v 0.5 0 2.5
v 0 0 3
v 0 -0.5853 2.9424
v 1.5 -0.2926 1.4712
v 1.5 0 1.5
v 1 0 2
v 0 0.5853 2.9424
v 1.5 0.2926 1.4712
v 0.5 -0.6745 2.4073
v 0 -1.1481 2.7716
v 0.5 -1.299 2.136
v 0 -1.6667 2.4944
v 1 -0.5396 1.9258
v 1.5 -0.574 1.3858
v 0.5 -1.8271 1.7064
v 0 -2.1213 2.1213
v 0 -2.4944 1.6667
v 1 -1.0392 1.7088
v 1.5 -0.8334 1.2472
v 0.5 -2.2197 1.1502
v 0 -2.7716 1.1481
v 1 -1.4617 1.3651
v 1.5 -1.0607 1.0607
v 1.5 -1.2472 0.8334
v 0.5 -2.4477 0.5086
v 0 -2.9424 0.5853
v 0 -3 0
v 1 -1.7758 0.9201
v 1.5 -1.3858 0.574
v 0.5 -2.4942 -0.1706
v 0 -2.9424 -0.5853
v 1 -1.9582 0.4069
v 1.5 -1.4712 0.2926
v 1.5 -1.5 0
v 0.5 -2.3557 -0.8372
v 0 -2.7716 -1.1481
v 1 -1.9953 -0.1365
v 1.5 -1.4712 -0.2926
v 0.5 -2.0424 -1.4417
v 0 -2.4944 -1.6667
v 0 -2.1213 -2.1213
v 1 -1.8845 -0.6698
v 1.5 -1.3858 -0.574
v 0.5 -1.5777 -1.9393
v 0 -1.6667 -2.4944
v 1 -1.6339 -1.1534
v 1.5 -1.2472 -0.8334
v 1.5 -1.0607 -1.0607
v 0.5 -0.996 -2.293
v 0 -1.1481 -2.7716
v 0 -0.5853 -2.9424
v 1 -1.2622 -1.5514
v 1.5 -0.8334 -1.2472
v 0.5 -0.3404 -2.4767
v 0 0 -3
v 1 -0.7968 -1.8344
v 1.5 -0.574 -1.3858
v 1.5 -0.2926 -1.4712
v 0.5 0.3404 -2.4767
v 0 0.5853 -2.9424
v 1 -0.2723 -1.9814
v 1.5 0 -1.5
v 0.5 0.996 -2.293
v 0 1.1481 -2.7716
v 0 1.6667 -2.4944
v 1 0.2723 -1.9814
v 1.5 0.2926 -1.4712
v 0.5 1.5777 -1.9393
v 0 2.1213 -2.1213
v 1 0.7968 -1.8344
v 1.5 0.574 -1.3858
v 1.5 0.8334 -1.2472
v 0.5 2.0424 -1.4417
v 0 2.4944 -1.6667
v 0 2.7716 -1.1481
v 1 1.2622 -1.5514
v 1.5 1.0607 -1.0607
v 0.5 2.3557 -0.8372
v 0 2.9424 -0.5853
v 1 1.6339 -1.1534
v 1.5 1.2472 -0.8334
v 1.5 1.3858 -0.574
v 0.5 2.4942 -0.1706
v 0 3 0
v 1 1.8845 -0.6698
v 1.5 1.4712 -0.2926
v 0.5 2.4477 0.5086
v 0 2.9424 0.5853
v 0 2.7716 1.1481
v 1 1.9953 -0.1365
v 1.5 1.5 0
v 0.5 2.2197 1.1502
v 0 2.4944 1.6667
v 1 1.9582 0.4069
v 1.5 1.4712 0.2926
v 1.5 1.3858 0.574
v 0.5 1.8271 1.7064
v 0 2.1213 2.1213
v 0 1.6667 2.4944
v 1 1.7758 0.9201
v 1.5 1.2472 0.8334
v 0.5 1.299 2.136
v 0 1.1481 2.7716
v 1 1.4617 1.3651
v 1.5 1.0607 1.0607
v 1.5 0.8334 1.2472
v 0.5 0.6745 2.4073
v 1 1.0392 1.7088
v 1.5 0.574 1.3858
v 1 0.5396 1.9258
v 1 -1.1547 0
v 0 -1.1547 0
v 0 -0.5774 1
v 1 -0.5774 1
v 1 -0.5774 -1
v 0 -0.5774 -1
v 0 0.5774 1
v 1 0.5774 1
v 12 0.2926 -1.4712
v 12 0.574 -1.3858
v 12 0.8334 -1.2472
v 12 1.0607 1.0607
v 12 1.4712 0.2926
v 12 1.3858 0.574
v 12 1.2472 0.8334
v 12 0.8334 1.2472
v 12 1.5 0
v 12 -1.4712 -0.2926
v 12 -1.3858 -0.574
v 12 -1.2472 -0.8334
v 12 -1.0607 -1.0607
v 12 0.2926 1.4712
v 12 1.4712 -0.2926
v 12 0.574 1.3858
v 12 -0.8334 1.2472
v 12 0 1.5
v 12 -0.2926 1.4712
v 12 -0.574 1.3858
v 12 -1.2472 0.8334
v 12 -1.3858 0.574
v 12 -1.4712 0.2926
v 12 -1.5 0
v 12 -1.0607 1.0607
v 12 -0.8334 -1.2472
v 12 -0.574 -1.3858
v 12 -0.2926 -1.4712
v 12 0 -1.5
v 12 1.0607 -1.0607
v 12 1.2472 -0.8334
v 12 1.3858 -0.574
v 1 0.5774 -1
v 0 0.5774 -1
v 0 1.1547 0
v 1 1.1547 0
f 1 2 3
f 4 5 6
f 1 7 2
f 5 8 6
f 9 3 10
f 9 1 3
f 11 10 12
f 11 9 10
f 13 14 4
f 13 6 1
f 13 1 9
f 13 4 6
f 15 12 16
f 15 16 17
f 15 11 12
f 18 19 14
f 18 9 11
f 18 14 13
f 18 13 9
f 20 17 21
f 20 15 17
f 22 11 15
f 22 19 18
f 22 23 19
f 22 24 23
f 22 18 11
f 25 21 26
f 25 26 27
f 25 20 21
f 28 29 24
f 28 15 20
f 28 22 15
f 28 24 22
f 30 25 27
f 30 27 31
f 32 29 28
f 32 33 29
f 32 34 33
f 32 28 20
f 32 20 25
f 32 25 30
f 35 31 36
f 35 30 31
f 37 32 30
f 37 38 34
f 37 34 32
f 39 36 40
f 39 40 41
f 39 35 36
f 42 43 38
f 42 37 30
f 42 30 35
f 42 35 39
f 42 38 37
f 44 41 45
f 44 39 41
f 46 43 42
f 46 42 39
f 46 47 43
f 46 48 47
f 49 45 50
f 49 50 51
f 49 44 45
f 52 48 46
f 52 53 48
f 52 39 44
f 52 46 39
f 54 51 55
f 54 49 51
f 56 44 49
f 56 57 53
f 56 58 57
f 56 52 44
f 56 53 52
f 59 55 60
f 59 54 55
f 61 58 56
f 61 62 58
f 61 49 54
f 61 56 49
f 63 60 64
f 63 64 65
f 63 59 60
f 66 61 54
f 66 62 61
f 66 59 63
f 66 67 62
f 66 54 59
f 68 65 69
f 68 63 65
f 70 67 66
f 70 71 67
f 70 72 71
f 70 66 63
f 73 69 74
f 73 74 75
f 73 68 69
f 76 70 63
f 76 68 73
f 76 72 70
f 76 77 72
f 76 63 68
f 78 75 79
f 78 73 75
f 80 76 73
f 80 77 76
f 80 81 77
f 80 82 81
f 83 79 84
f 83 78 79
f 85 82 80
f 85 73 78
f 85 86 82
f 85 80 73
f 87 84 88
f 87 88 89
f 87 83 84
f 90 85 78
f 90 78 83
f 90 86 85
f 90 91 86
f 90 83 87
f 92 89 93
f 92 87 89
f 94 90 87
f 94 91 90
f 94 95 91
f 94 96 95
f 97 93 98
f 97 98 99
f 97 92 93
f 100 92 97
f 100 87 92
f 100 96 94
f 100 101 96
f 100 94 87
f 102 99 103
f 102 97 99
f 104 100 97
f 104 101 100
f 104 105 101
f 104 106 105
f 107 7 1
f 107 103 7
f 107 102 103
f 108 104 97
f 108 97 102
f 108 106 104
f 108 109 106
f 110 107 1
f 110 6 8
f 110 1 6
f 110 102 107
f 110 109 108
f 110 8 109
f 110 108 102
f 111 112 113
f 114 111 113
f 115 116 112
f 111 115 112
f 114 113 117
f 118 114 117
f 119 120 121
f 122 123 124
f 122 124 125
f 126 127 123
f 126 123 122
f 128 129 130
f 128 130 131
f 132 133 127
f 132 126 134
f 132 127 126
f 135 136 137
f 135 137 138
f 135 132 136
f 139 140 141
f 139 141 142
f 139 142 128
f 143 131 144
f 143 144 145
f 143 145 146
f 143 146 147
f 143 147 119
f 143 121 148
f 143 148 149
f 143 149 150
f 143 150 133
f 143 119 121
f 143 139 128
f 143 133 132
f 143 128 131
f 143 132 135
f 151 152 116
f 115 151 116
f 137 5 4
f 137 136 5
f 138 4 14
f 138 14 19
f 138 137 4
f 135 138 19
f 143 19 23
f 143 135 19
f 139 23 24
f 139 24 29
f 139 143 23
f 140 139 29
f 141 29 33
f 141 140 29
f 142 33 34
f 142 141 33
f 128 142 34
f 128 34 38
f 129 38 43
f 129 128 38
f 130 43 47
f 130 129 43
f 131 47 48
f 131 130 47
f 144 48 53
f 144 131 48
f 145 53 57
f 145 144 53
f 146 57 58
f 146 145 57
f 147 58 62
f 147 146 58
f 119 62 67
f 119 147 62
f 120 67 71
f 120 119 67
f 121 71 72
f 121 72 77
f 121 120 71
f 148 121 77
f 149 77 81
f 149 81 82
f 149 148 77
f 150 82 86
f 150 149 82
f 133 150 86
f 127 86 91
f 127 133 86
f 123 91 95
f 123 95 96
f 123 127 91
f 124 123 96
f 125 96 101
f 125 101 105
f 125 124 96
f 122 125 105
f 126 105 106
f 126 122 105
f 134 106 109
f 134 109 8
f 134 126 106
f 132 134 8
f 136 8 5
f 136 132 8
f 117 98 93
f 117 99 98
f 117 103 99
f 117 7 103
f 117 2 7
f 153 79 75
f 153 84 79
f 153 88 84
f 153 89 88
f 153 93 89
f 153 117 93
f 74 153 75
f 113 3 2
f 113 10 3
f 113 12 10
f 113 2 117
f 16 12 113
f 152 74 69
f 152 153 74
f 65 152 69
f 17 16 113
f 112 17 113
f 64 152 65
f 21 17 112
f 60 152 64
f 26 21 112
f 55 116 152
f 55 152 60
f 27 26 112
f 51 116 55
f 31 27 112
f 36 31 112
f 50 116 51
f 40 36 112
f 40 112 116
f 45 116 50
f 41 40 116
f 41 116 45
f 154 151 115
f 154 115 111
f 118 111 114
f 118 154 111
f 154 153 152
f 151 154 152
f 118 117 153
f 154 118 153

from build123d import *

# Parameters (mm, degrees)
CUT_EXTRUDE_1_DEPTH = 1


with BuildPart() as part:
    # 草图1 → 旋转1 (revolve)
    with BuildSketch(Plane.XY, mode=Mode.PRIVATE) as revolve_1_sk:
        Polygon((0, 0), (0, 3), (1.5, 1.5), (12, 1.5), (12, 0), align=None)
    revolve(revolve_1_sk.sketch.rotate(Axis((0, 0, 0), (1, 0, 0)), 90), axis=Axis((0, 0, 0), (1, 0, 0)))

    # 草图2 → 切除-拉伸1 (cut)
    with BuildSketch(Plane.ZY):
        Polygon((0, 1.154700538), (-1, 0.577350269), (-1, -0.577350269), (0, -1.154700538), (1, -0.577350269), (1, 0.577350269), align=None)
    extrude(amount=-CUT_EXTRUDE_1_DEPTH, mode=Mode.SUBTRACT)


solid = part.part
